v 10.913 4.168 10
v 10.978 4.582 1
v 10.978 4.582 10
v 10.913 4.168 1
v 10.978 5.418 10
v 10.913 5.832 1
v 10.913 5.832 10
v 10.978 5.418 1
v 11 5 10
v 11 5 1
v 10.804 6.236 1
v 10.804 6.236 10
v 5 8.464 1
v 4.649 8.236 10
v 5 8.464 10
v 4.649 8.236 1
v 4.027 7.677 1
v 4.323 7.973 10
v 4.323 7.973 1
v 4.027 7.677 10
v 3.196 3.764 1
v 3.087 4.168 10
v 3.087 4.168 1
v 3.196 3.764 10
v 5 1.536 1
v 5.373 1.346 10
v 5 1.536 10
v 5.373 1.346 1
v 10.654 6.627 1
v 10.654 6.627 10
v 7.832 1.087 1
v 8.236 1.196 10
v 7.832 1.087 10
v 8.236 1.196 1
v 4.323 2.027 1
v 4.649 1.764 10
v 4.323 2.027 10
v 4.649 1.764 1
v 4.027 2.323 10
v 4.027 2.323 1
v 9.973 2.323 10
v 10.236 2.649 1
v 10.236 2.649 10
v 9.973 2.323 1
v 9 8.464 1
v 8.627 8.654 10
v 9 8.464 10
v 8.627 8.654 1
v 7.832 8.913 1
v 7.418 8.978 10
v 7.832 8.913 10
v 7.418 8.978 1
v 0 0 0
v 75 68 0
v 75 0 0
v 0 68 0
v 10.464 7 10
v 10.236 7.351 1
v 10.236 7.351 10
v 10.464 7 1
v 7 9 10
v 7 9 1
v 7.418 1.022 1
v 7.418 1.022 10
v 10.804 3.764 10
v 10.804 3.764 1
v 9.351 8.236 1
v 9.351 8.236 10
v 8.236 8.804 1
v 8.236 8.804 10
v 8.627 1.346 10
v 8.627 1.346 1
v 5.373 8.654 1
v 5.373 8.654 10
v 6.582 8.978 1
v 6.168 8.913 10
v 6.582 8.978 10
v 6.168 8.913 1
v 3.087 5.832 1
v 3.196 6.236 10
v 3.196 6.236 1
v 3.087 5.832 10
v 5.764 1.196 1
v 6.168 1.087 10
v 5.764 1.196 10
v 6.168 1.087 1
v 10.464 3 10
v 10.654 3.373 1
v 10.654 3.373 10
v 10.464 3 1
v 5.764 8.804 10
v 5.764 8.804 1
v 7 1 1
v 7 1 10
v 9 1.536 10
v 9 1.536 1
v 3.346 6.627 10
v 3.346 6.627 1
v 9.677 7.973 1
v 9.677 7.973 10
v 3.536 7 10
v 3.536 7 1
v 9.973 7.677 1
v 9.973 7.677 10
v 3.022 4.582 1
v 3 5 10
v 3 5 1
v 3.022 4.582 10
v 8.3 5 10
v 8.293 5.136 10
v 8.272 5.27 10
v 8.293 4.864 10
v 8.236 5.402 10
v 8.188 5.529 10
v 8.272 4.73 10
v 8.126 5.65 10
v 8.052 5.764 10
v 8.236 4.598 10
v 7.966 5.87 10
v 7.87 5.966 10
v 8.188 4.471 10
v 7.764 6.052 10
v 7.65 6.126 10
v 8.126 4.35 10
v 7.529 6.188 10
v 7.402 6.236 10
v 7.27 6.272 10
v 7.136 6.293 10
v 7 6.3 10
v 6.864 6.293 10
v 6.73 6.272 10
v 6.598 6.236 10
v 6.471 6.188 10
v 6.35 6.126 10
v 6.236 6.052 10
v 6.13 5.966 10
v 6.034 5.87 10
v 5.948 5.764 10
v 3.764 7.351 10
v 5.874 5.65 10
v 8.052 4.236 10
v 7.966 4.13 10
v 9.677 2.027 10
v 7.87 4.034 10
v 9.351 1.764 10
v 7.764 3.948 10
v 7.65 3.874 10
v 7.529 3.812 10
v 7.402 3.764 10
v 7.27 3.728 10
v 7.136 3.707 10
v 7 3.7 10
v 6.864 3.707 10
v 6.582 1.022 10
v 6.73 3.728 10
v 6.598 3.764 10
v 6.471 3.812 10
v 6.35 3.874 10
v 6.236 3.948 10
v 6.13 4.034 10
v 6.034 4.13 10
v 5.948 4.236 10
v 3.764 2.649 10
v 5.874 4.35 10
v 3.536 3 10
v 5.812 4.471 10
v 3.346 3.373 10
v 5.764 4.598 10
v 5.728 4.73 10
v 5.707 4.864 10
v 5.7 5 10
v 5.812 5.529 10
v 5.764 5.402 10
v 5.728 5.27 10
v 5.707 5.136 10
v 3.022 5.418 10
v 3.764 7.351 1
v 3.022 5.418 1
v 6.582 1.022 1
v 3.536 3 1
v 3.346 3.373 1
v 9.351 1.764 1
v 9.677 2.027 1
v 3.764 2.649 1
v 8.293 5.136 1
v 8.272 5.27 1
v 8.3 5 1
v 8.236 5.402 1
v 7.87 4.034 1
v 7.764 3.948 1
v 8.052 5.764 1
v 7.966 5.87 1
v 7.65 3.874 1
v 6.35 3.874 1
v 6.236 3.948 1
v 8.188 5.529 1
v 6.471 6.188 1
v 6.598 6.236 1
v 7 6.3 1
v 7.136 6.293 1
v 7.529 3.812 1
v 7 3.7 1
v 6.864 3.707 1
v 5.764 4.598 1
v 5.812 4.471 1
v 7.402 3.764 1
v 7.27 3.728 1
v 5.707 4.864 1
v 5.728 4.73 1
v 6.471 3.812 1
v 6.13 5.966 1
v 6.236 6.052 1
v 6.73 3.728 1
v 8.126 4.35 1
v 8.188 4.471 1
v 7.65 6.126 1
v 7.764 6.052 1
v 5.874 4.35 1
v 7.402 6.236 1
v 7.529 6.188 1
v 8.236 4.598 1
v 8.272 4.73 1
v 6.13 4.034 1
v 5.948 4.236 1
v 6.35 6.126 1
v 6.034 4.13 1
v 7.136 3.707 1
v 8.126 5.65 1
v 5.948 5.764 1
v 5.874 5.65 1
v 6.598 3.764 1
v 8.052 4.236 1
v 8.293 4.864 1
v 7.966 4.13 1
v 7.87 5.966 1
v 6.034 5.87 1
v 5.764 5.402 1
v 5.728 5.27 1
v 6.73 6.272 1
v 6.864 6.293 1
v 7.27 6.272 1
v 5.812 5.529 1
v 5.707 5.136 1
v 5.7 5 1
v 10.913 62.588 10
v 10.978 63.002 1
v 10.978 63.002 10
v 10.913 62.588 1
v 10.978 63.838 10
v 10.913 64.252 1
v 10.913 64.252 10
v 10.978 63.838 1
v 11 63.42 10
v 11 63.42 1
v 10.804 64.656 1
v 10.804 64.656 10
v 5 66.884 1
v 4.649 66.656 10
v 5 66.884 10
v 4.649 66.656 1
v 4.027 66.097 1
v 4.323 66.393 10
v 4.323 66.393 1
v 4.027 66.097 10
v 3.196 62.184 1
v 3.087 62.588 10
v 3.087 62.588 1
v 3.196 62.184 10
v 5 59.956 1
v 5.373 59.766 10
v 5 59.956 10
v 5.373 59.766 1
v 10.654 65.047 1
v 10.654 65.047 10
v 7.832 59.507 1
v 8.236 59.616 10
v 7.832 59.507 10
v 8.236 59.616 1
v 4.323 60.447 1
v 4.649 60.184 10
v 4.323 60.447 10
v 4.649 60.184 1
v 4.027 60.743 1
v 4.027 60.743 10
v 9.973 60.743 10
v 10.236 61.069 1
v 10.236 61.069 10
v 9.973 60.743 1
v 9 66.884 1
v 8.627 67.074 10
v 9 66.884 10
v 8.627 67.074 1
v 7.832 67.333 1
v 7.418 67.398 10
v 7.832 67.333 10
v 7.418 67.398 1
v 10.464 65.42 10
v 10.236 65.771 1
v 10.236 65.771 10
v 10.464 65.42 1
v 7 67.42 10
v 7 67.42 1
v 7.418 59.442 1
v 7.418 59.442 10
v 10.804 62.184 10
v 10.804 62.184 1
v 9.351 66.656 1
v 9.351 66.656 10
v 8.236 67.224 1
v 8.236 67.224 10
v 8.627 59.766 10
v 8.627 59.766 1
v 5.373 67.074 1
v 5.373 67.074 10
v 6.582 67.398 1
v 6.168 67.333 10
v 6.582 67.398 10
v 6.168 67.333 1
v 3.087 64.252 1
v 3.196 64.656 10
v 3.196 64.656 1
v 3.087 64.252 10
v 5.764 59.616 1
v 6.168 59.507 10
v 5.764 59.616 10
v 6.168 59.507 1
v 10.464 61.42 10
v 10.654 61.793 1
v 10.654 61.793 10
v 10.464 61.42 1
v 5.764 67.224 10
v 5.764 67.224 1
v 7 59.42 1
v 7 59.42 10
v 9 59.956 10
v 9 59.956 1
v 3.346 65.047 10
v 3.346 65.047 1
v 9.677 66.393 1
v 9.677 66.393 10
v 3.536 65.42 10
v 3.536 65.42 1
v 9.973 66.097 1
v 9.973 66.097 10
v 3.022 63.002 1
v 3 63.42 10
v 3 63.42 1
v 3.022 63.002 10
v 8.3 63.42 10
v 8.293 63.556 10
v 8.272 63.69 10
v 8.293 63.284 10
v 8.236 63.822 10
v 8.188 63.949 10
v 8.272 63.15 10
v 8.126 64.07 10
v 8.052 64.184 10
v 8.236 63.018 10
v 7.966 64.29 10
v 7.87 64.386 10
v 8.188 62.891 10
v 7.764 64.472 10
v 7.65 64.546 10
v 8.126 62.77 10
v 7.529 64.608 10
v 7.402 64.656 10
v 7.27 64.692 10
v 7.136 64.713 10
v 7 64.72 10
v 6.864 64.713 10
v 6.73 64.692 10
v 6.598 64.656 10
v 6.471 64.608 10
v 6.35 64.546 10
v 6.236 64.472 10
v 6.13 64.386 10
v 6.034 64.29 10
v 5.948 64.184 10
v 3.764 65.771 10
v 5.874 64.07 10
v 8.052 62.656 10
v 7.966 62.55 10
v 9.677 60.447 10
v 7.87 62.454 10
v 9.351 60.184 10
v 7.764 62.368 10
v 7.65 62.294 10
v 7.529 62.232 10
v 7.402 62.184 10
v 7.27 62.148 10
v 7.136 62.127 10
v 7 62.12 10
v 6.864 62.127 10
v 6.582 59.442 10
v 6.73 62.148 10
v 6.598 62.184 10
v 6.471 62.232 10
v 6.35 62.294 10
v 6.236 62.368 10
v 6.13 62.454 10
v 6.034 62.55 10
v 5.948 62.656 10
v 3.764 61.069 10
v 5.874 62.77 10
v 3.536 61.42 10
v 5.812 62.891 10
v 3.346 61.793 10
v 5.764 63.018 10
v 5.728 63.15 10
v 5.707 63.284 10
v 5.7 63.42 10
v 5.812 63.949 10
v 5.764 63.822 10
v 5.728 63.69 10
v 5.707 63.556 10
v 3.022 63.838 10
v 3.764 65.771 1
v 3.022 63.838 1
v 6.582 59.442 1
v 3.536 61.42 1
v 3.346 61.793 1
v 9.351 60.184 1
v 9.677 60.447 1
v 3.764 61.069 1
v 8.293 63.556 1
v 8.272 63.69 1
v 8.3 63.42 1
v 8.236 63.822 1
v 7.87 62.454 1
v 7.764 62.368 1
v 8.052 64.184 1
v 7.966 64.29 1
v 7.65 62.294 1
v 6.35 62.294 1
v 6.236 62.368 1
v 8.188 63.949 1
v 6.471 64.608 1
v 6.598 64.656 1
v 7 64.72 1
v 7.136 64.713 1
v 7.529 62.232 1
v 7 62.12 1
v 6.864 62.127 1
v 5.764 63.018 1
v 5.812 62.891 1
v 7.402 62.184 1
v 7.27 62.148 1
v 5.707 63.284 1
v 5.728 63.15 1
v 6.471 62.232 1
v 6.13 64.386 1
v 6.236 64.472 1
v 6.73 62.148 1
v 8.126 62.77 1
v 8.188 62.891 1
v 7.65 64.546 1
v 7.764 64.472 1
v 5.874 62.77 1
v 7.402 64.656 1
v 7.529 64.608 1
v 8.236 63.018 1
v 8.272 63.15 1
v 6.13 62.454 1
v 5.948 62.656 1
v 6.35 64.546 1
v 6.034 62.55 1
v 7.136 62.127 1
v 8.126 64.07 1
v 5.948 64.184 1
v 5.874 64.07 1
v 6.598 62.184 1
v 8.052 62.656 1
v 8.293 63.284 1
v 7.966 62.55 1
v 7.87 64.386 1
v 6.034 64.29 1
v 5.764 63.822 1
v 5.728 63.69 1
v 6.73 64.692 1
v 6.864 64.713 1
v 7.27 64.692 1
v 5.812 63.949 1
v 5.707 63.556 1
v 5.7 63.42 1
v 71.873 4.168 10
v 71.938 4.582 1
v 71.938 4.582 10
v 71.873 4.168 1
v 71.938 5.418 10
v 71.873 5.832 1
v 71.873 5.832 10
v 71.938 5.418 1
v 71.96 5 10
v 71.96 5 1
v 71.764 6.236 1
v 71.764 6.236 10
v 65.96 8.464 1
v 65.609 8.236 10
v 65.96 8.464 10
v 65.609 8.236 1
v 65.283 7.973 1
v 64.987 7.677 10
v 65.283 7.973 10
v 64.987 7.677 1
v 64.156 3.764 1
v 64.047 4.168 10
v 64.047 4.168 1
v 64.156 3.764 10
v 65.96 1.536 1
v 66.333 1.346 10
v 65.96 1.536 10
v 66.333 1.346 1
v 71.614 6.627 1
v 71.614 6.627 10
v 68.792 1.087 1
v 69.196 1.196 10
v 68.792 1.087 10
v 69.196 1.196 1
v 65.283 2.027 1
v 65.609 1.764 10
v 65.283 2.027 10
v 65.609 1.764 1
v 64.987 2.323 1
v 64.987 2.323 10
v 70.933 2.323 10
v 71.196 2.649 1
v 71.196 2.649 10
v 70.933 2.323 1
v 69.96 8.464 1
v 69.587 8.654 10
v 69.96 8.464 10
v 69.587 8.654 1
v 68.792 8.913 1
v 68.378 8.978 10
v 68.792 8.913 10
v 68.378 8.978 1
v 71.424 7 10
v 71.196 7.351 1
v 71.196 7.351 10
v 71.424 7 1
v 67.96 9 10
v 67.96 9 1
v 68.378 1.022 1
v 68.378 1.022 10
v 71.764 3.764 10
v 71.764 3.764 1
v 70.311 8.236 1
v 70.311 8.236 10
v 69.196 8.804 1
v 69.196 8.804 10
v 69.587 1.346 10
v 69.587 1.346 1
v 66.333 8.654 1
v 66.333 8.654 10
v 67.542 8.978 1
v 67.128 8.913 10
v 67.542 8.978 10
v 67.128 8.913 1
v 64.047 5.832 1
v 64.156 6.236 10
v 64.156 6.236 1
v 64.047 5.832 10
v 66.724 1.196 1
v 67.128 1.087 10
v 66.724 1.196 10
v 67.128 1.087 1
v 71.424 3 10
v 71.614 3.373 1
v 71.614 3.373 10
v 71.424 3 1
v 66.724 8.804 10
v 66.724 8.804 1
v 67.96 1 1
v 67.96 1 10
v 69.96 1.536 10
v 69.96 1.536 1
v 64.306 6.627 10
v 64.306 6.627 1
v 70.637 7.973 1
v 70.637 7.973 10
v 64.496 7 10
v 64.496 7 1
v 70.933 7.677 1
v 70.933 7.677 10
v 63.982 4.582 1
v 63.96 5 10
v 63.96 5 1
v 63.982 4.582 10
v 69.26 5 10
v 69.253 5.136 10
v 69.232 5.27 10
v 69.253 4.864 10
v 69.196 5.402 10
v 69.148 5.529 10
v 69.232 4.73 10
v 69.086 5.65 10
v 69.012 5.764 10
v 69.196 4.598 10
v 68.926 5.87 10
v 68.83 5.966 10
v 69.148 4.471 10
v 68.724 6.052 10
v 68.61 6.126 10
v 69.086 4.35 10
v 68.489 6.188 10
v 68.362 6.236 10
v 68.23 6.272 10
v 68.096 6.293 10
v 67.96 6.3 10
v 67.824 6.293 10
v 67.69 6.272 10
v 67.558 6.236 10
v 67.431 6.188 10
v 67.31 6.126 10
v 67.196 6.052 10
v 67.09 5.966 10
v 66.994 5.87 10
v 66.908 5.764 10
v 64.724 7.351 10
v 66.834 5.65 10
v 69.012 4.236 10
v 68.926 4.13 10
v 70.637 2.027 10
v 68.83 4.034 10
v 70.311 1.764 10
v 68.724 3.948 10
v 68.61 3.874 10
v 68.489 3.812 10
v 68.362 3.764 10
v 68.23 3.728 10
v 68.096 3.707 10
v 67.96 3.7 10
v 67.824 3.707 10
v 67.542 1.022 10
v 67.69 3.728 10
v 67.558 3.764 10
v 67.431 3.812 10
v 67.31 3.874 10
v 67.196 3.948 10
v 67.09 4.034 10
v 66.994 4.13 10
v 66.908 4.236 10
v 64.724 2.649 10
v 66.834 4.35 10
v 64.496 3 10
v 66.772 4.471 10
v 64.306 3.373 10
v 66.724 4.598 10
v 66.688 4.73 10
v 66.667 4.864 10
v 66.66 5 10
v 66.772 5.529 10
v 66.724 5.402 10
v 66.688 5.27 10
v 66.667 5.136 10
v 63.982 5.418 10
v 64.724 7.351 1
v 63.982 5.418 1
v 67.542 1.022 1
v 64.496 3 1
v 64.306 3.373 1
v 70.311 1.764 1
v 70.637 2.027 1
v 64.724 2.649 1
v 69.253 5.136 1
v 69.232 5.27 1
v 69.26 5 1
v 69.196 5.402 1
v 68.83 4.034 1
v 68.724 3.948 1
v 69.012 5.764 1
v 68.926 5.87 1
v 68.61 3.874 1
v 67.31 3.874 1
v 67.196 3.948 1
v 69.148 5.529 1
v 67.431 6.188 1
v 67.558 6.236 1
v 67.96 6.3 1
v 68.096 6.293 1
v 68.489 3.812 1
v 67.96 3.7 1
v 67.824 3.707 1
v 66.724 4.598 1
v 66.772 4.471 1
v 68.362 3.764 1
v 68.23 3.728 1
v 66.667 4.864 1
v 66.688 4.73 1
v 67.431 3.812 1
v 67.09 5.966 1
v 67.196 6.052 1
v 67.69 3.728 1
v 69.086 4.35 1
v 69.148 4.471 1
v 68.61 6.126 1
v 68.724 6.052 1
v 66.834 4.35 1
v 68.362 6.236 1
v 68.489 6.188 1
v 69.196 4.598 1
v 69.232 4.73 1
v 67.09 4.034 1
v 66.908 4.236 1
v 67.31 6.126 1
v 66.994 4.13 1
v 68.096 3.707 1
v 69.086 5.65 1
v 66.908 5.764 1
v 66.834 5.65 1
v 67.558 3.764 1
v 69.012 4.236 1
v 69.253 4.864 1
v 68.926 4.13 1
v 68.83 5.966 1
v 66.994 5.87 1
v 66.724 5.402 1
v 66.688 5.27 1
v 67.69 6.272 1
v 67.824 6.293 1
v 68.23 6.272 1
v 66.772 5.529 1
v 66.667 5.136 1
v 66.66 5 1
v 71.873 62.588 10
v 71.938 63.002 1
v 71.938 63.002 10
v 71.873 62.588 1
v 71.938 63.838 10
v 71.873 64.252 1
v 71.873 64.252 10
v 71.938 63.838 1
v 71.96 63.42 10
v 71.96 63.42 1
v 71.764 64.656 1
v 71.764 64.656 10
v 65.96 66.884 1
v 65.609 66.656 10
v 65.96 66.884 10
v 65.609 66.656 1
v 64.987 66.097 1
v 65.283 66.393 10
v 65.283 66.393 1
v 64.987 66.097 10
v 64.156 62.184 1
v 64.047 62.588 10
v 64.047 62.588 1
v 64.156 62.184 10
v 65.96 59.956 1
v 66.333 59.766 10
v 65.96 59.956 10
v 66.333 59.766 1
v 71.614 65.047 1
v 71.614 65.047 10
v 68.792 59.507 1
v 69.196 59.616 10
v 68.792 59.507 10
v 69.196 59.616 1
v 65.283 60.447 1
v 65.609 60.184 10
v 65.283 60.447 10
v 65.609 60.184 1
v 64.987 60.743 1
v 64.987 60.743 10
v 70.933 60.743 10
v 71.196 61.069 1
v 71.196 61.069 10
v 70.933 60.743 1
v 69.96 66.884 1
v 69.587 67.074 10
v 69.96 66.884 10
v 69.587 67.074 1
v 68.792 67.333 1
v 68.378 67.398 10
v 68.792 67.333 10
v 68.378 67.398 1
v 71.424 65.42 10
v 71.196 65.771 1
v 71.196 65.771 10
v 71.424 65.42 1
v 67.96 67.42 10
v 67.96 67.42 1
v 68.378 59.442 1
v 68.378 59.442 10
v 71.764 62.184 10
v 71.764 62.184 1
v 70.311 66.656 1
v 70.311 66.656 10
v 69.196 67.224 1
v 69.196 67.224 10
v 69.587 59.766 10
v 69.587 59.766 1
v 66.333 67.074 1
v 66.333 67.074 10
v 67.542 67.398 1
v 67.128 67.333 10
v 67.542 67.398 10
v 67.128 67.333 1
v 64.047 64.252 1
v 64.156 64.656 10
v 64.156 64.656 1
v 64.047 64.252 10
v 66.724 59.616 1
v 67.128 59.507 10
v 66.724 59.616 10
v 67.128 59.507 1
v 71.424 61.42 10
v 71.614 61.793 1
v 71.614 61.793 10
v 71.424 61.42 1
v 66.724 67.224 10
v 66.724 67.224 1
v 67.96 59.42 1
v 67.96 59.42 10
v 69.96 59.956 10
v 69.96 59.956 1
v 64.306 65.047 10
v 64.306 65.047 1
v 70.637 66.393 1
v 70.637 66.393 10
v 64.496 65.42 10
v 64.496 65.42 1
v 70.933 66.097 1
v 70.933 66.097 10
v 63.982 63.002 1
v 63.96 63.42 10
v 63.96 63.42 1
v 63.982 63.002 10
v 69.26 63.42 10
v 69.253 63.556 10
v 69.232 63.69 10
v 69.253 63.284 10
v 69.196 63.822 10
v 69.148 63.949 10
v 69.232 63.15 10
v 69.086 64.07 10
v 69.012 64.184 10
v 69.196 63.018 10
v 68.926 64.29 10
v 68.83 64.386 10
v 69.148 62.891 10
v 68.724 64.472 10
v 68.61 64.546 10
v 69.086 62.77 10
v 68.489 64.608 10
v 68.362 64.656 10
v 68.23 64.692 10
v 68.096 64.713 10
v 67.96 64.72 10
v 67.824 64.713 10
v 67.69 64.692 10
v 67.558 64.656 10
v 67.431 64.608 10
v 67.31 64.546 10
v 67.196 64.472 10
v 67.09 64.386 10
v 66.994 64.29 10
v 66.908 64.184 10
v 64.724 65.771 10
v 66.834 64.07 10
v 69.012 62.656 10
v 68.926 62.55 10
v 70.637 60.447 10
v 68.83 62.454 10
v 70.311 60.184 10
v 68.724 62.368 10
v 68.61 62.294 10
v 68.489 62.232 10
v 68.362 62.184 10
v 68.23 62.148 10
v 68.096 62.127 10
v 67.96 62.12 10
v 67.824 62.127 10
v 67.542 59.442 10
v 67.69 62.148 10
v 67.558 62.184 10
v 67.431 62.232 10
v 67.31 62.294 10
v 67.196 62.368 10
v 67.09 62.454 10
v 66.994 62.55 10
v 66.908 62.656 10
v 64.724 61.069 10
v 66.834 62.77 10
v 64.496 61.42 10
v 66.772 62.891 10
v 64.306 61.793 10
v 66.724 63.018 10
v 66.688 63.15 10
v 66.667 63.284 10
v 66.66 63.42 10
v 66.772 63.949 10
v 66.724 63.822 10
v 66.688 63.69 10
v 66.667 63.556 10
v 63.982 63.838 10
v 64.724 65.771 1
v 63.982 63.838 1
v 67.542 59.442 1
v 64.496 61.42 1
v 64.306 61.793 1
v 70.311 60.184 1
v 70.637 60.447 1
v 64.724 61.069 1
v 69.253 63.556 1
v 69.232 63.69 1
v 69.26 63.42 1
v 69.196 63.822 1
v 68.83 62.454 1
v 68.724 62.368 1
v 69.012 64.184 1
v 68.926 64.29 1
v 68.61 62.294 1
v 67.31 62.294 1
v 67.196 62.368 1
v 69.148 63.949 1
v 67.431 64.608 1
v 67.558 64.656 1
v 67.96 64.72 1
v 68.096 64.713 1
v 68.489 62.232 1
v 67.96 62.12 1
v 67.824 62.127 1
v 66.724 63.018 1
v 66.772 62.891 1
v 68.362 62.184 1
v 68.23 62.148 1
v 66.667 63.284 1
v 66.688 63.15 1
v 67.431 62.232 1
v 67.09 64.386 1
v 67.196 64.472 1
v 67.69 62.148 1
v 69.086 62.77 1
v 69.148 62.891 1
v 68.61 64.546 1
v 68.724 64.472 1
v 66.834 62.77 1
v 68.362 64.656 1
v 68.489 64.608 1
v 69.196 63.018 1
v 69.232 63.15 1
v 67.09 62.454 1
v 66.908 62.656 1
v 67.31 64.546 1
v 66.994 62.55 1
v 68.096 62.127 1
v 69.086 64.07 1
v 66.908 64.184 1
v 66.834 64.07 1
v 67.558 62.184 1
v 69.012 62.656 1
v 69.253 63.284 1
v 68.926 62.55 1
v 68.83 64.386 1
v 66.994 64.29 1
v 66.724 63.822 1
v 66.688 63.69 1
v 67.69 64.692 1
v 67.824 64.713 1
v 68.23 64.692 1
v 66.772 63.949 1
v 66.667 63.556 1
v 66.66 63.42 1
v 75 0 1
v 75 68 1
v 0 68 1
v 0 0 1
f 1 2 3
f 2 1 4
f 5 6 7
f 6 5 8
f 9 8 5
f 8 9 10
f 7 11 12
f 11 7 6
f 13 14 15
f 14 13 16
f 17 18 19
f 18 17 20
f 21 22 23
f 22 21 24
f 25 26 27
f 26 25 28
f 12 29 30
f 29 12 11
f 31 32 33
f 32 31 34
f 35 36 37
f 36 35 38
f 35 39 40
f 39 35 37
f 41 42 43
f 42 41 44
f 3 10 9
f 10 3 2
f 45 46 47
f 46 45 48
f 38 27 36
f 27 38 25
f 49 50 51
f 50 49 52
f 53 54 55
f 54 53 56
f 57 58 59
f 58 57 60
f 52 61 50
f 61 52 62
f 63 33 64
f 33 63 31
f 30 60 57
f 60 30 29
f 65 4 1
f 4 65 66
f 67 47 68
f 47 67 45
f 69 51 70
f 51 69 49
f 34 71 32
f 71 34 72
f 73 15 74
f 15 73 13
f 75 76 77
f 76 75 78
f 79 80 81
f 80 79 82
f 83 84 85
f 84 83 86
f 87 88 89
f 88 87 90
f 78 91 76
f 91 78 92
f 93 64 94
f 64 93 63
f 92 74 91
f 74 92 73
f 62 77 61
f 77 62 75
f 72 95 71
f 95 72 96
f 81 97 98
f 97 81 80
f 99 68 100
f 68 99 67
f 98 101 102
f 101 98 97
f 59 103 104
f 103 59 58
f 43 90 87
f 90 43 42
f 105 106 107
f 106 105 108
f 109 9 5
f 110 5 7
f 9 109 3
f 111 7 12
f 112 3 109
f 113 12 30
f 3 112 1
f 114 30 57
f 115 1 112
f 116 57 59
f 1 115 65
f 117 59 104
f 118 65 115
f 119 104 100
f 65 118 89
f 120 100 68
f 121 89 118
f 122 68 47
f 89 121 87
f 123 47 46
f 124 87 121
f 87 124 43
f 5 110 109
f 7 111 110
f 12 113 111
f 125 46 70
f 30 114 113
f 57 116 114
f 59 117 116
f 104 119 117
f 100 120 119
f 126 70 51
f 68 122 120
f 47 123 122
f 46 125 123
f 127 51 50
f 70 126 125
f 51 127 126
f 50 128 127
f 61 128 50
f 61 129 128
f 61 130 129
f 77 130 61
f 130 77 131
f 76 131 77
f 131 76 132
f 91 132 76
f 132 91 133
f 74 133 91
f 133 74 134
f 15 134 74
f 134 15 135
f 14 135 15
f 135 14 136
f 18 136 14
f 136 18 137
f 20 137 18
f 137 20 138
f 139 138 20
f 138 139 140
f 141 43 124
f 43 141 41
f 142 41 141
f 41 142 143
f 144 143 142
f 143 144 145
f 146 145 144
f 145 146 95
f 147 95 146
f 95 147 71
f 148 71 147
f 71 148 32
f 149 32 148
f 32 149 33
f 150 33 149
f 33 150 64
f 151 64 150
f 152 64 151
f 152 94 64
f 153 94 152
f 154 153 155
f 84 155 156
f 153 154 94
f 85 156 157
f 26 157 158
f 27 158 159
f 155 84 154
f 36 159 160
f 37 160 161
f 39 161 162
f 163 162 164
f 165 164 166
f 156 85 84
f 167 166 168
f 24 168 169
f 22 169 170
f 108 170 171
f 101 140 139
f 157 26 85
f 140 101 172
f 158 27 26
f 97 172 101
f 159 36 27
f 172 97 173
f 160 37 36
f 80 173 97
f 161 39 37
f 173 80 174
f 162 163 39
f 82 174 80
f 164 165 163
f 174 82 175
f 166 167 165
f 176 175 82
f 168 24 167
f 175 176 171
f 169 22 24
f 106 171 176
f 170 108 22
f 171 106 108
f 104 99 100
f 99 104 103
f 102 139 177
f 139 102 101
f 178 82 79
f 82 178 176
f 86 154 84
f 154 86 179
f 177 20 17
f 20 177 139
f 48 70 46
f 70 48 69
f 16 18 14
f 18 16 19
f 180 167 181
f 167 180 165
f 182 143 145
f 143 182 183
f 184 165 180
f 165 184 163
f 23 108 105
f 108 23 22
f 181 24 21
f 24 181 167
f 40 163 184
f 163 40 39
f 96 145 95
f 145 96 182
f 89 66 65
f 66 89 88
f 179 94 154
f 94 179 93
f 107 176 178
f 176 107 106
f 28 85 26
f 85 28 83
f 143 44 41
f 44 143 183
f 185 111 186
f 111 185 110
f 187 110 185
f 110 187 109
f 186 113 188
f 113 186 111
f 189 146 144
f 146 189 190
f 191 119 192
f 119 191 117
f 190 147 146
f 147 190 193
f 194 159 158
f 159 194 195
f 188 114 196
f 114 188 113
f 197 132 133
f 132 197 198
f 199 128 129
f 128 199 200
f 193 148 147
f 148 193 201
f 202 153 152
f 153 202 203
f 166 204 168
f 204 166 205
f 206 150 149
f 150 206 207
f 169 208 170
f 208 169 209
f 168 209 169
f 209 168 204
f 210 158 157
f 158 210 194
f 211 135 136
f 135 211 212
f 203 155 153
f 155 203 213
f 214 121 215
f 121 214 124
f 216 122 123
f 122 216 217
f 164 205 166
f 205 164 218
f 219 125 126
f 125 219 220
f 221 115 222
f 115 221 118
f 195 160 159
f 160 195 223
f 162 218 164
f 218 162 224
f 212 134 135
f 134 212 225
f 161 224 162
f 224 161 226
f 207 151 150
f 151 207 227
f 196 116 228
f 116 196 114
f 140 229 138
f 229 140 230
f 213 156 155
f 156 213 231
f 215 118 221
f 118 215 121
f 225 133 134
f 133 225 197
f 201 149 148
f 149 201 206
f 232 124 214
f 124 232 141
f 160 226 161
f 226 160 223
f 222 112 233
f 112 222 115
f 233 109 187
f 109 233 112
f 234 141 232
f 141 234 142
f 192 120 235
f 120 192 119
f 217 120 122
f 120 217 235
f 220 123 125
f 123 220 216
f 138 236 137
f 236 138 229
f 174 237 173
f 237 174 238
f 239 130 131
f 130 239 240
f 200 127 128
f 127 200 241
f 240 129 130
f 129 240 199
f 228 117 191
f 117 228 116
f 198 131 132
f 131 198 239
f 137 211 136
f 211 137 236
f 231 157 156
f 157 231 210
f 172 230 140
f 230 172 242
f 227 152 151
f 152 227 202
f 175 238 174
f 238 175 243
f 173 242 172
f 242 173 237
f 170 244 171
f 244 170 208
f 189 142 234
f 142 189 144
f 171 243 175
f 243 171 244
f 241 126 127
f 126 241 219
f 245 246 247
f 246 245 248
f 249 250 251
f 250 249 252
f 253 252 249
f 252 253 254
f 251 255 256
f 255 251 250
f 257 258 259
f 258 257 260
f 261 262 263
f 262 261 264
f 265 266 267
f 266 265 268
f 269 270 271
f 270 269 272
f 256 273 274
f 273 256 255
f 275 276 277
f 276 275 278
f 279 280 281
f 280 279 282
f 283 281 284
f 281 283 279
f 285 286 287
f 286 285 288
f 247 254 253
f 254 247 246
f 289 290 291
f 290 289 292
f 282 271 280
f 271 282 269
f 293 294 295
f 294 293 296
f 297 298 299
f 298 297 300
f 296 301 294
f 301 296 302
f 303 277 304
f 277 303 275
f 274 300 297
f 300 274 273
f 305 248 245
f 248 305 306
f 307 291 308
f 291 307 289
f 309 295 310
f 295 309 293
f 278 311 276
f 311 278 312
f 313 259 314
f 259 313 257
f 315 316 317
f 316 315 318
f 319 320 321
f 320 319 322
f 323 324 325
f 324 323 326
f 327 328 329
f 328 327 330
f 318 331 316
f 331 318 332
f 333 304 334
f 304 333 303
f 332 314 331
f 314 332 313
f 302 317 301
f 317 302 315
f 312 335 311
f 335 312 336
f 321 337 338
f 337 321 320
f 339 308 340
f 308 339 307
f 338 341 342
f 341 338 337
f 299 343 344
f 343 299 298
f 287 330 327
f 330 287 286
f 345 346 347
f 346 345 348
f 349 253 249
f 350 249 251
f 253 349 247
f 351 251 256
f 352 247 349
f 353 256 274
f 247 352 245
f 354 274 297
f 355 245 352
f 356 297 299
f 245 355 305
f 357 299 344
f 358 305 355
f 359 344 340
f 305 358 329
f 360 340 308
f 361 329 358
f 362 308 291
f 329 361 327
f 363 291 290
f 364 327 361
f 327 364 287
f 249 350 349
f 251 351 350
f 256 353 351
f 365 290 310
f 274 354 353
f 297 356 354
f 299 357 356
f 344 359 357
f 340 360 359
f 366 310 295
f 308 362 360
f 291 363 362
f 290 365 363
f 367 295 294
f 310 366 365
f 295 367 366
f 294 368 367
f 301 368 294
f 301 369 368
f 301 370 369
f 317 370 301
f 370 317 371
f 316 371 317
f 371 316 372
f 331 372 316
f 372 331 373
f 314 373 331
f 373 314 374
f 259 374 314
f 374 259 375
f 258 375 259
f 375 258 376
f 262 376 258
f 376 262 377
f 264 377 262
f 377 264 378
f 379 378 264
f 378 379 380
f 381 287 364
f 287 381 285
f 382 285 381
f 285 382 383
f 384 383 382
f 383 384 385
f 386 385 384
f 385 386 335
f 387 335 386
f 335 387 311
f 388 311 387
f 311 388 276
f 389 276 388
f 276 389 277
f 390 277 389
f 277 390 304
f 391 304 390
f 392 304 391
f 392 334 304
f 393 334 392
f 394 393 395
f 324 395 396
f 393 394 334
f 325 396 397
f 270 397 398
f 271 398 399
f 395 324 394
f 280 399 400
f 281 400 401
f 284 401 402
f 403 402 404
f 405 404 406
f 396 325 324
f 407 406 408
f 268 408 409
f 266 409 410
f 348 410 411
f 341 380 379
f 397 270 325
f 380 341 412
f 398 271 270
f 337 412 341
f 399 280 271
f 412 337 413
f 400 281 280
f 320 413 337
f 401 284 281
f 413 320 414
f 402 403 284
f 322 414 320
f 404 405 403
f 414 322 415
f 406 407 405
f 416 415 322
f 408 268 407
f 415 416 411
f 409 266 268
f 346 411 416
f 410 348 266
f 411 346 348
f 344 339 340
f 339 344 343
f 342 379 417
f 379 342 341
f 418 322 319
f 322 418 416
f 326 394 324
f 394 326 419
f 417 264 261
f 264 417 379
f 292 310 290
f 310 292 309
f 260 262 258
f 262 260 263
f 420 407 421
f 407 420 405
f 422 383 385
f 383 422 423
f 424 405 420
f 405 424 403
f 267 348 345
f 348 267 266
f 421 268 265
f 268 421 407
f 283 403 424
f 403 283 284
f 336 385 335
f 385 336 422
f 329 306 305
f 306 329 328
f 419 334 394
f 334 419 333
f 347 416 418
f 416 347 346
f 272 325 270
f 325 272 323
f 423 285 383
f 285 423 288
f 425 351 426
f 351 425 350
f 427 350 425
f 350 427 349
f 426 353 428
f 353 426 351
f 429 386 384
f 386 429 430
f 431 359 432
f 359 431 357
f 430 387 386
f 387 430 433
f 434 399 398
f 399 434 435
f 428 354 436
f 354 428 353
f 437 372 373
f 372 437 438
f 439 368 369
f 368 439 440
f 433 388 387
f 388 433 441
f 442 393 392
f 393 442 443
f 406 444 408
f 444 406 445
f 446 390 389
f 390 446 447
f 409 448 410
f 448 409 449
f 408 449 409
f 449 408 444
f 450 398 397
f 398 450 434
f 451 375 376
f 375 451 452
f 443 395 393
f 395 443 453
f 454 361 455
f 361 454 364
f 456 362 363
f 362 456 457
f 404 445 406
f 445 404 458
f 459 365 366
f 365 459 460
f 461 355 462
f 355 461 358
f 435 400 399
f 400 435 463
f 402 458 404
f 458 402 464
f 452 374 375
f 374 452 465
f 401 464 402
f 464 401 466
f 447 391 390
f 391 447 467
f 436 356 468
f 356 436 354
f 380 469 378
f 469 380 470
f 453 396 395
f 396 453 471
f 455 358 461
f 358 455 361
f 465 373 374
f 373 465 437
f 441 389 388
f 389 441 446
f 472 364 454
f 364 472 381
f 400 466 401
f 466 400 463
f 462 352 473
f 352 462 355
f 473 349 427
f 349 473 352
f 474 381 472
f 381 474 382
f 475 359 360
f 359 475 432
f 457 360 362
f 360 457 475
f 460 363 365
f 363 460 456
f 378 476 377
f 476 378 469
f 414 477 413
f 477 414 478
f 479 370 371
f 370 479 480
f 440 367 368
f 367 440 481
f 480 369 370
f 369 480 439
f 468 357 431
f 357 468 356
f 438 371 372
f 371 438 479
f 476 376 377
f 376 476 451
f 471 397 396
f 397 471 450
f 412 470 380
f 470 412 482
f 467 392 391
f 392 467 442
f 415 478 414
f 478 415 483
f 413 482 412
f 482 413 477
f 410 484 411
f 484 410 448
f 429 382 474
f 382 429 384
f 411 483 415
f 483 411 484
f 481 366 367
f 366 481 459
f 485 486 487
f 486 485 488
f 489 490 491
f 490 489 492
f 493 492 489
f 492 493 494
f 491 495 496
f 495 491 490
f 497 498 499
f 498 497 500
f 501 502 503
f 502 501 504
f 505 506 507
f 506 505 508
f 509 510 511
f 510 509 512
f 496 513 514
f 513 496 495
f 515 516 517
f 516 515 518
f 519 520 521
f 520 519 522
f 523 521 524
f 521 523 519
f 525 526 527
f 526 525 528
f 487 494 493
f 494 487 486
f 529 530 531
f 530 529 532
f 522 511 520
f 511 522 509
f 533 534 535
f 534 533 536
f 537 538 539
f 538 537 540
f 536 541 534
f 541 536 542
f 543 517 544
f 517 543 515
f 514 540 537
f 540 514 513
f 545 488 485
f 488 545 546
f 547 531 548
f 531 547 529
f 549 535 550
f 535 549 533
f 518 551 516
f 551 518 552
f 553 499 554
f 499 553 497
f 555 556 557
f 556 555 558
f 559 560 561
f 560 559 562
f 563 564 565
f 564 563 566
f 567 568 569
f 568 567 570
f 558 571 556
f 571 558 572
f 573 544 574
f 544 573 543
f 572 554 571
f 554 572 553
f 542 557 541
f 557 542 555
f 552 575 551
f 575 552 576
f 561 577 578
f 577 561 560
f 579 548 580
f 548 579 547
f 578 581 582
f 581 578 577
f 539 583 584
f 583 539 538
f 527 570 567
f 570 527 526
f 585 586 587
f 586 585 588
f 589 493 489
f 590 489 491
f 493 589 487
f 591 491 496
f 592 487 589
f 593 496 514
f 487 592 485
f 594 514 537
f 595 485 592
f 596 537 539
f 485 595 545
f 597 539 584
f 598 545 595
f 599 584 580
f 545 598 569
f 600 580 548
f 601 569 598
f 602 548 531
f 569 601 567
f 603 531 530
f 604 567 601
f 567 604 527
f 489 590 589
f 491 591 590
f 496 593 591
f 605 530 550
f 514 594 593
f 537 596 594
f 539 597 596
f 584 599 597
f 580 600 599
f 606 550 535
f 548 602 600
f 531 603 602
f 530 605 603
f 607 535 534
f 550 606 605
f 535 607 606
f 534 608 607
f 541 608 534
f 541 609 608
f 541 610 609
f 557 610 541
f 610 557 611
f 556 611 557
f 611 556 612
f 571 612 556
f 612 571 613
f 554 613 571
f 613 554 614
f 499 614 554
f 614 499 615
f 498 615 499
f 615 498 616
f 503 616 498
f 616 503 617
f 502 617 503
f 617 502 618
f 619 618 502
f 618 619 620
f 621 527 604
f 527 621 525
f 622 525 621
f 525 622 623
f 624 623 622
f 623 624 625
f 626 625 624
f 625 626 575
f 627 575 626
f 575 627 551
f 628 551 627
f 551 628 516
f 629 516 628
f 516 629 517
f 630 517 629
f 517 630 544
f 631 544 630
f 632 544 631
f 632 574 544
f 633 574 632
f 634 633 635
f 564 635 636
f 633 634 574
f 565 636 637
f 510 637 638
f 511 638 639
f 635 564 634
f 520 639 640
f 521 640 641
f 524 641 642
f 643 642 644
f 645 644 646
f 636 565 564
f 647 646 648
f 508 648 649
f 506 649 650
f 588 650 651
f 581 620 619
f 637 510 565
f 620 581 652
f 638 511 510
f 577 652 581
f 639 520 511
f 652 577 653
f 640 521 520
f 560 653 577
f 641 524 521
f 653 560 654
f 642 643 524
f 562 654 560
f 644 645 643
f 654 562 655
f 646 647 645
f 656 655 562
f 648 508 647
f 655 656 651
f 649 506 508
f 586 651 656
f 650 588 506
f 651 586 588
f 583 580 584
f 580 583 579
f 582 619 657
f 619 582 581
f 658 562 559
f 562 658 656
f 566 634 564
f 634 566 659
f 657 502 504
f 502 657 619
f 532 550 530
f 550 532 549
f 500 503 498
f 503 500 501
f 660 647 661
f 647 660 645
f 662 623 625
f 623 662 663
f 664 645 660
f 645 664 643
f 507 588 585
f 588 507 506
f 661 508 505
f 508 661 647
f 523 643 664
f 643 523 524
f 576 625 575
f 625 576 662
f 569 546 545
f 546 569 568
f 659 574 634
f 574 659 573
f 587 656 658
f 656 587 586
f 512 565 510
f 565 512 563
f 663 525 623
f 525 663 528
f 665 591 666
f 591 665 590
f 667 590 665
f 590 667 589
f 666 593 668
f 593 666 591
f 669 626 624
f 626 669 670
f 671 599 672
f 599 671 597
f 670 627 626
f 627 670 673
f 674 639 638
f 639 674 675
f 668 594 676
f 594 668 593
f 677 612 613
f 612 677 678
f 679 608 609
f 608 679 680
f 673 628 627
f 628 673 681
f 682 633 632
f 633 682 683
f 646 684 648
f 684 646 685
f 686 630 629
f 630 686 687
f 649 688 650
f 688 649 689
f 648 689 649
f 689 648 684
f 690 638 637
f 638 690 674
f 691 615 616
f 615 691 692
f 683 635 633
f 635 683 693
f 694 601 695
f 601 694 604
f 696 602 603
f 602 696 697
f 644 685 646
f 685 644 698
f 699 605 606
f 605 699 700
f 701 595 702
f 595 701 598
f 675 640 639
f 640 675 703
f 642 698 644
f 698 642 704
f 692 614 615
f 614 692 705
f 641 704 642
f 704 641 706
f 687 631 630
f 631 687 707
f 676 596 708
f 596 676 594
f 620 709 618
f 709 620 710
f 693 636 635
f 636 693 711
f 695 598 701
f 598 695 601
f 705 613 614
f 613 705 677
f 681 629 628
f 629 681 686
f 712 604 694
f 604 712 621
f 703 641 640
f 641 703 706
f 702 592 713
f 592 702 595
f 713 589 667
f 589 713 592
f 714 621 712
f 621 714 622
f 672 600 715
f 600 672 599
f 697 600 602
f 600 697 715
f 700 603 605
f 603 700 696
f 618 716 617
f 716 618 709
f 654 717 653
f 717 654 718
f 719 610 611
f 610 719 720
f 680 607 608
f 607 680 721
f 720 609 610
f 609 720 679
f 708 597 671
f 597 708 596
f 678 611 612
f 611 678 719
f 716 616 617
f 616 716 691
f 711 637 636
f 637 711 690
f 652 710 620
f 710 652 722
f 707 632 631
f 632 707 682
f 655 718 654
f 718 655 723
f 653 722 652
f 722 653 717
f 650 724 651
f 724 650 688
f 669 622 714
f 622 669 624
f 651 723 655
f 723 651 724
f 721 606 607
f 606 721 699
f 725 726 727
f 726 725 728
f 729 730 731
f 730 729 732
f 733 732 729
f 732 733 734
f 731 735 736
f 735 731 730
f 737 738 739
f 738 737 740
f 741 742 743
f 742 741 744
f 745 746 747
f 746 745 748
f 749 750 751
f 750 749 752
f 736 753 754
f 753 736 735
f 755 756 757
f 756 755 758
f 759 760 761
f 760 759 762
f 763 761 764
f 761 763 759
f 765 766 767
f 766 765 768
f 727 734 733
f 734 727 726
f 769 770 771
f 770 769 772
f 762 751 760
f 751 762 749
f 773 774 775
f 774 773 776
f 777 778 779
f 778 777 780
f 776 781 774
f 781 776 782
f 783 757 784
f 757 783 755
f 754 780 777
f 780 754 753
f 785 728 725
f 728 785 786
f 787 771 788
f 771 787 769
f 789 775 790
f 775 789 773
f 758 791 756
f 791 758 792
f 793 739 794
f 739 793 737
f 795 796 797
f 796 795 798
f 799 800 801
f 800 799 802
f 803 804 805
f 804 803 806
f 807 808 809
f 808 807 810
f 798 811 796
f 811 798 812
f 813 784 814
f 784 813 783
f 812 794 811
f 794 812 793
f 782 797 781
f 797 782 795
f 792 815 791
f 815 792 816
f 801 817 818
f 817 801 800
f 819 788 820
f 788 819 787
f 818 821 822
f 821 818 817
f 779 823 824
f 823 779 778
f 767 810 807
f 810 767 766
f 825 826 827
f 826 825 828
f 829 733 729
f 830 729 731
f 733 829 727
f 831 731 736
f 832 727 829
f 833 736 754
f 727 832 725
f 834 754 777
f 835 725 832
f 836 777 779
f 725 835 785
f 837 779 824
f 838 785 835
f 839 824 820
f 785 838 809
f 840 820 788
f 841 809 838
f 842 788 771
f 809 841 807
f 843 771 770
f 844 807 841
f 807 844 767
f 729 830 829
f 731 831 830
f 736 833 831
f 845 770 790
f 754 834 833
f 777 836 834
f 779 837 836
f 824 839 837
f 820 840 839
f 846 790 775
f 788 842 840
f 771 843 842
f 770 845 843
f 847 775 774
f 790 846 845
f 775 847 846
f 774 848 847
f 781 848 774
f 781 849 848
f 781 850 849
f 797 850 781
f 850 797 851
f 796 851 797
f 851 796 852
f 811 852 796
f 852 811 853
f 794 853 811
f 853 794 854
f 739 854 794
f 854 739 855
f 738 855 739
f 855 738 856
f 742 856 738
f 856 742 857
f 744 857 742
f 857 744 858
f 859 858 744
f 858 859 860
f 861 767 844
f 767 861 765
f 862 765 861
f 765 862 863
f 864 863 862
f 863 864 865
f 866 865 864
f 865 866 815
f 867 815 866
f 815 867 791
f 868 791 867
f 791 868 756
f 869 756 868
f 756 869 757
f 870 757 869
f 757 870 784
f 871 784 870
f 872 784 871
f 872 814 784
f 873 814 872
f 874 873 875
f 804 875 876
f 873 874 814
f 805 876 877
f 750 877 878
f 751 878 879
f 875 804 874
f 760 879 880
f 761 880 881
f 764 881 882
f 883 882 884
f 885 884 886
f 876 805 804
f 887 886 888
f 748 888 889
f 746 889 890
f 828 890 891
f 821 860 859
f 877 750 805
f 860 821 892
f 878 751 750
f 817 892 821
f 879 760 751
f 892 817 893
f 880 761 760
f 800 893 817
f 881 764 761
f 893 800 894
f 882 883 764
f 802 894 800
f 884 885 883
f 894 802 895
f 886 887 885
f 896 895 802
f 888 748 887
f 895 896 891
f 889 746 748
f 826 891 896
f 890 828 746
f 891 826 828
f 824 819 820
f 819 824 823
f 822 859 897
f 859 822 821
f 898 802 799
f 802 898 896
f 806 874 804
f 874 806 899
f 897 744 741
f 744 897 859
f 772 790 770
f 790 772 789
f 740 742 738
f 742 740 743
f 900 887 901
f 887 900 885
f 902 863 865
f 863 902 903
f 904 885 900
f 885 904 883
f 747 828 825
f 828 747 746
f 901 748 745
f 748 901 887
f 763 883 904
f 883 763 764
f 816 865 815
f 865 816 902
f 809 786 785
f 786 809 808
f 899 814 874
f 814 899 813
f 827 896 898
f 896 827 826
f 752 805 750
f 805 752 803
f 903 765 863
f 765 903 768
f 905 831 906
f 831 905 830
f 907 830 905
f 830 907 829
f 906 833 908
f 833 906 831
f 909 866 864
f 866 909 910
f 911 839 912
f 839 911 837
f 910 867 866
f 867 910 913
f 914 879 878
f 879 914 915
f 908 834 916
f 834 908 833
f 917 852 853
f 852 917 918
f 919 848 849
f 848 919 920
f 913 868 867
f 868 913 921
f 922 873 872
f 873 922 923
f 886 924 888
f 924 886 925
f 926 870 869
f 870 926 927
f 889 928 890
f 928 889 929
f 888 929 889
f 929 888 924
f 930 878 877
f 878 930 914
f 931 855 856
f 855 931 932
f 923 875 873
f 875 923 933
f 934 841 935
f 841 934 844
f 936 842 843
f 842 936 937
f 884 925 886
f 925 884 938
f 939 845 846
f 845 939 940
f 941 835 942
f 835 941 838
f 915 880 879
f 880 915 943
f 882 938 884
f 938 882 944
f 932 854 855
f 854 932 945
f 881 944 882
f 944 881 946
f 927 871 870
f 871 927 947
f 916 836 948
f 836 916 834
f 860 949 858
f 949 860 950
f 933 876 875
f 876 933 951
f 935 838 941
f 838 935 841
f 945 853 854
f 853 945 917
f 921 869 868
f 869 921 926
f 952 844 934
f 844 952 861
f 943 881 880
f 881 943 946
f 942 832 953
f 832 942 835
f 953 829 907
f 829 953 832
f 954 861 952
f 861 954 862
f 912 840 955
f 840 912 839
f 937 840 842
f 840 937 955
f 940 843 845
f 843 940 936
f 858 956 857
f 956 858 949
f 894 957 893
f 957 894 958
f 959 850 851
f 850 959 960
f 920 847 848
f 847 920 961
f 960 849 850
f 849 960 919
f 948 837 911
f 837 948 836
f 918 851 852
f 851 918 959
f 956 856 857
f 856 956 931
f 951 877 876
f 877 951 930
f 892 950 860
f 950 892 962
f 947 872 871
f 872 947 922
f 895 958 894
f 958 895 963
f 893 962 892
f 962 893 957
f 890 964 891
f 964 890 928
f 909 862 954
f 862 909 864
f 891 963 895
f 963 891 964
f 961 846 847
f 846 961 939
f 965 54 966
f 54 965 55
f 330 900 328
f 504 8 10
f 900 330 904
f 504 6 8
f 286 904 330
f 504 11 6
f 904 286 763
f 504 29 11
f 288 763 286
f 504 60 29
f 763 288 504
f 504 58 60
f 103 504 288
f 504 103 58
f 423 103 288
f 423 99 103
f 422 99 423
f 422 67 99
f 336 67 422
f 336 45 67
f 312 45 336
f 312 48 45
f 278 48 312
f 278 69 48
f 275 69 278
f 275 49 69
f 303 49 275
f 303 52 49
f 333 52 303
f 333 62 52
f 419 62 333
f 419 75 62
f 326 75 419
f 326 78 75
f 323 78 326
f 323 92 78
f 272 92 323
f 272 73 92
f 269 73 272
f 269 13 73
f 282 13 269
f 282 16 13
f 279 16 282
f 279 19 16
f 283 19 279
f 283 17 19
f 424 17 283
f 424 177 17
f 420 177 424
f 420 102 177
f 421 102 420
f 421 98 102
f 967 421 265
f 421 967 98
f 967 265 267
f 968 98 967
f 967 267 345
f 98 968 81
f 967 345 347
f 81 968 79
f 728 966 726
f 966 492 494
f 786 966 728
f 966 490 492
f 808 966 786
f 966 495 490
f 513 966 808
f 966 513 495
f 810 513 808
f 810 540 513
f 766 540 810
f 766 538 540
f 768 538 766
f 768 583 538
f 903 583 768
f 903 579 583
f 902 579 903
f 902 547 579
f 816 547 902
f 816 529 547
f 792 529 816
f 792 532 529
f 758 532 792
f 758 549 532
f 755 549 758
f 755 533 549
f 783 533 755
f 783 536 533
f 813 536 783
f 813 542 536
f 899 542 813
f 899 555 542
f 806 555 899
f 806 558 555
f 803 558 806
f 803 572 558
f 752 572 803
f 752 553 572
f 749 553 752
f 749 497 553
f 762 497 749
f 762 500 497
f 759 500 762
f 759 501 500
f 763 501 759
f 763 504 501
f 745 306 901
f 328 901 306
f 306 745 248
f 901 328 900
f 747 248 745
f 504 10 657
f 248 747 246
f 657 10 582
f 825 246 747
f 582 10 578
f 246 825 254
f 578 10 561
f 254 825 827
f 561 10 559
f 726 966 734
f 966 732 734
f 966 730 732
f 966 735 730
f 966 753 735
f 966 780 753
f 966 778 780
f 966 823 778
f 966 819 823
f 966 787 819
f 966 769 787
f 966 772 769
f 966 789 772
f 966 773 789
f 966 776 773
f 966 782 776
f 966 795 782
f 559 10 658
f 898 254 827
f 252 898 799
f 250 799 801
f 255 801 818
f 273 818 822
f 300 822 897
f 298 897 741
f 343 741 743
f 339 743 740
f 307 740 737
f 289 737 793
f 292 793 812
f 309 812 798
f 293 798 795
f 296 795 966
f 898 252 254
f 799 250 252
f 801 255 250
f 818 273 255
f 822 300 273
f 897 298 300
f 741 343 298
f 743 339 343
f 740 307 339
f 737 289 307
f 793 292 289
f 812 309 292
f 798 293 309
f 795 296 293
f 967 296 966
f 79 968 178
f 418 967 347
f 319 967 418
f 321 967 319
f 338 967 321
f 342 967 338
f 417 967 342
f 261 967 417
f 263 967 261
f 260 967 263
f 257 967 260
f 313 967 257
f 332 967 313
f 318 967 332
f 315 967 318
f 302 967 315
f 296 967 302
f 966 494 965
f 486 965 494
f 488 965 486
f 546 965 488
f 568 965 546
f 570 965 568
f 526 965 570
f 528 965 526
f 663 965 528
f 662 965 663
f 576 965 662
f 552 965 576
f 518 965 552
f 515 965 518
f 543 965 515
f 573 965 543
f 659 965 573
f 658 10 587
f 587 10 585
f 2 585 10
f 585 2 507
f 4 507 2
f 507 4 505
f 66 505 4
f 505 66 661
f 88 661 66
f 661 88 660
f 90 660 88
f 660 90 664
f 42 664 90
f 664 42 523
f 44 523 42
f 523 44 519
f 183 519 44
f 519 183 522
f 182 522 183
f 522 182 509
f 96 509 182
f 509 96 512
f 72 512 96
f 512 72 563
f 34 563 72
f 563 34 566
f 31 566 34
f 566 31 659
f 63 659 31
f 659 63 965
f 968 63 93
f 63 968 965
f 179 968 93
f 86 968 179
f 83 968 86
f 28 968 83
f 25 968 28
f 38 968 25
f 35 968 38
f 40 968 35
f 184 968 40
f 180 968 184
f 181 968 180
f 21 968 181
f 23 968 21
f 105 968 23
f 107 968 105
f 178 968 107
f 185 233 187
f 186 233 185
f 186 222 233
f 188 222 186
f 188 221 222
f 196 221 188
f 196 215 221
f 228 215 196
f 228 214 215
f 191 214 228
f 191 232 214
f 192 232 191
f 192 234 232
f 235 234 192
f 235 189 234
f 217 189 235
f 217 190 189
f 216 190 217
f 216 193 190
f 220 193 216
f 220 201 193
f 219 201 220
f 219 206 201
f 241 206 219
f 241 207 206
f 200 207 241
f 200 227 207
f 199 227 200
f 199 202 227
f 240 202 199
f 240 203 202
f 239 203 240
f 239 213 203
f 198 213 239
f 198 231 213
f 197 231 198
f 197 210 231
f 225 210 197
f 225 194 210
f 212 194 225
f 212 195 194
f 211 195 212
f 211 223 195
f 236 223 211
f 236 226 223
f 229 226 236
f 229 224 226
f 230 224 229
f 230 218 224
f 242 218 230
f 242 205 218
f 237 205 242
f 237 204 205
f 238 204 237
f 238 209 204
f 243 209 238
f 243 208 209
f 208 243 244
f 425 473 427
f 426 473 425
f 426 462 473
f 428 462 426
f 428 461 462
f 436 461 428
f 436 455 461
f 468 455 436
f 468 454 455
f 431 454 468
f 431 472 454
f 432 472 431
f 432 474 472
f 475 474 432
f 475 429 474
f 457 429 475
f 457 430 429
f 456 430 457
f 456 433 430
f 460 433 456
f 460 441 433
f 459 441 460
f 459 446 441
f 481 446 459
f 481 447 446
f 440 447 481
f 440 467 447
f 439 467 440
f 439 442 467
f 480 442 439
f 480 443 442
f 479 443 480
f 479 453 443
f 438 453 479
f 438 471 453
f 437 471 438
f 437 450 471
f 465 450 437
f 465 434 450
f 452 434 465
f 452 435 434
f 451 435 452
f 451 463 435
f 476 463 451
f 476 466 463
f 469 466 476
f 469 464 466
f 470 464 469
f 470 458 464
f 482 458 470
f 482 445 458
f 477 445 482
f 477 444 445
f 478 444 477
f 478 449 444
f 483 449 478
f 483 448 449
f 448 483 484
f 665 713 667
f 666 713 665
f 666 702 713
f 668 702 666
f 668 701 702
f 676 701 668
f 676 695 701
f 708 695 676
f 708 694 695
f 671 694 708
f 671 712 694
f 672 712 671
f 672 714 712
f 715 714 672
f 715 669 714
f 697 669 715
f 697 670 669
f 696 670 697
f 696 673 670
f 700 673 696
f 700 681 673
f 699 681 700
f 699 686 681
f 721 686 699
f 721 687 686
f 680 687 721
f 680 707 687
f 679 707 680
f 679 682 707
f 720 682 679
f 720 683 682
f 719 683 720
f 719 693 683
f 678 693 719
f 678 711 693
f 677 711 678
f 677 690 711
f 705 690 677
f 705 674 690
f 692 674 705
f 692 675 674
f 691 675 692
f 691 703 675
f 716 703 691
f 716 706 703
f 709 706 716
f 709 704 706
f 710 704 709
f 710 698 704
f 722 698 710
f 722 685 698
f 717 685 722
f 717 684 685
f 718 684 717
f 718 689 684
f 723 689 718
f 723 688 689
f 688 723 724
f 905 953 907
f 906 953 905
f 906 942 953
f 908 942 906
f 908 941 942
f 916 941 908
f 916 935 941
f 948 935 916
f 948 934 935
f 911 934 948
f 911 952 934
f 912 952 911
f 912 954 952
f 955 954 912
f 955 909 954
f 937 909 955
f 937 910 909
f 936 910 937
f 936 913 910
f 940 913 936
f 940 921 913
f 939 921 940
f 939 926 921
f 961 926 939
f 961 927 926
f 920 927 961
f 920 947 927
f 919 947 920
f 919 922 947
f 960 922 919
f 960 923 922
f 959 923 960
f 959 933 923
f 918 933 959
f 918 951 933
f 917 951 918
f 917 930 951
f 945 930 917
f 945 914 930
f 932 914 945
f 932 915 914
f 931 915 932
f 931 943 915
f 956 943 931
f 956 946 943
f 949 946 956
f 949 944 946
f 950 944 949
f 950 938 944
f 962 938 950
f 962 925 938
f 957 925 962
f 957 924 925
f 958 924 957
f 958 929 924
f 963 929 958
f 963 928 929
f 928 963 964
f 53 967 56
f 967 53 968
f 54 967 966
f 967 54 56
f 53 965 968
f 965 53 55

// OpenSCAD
$fn=60;

module pin(h = 10) {
    difference() {
        cylinder(r = 4, h = h);
        cylinder(r = 1.3, h = h);
    }
}

module base() {
    dx = 60.96;
    dy = 58.42;
    cube([75, 68, 1]);
    for (x = [0, dx])
        for (y = [0, dy])
            translate([7+x, 5 + y, 0]) pin();
}

base();
